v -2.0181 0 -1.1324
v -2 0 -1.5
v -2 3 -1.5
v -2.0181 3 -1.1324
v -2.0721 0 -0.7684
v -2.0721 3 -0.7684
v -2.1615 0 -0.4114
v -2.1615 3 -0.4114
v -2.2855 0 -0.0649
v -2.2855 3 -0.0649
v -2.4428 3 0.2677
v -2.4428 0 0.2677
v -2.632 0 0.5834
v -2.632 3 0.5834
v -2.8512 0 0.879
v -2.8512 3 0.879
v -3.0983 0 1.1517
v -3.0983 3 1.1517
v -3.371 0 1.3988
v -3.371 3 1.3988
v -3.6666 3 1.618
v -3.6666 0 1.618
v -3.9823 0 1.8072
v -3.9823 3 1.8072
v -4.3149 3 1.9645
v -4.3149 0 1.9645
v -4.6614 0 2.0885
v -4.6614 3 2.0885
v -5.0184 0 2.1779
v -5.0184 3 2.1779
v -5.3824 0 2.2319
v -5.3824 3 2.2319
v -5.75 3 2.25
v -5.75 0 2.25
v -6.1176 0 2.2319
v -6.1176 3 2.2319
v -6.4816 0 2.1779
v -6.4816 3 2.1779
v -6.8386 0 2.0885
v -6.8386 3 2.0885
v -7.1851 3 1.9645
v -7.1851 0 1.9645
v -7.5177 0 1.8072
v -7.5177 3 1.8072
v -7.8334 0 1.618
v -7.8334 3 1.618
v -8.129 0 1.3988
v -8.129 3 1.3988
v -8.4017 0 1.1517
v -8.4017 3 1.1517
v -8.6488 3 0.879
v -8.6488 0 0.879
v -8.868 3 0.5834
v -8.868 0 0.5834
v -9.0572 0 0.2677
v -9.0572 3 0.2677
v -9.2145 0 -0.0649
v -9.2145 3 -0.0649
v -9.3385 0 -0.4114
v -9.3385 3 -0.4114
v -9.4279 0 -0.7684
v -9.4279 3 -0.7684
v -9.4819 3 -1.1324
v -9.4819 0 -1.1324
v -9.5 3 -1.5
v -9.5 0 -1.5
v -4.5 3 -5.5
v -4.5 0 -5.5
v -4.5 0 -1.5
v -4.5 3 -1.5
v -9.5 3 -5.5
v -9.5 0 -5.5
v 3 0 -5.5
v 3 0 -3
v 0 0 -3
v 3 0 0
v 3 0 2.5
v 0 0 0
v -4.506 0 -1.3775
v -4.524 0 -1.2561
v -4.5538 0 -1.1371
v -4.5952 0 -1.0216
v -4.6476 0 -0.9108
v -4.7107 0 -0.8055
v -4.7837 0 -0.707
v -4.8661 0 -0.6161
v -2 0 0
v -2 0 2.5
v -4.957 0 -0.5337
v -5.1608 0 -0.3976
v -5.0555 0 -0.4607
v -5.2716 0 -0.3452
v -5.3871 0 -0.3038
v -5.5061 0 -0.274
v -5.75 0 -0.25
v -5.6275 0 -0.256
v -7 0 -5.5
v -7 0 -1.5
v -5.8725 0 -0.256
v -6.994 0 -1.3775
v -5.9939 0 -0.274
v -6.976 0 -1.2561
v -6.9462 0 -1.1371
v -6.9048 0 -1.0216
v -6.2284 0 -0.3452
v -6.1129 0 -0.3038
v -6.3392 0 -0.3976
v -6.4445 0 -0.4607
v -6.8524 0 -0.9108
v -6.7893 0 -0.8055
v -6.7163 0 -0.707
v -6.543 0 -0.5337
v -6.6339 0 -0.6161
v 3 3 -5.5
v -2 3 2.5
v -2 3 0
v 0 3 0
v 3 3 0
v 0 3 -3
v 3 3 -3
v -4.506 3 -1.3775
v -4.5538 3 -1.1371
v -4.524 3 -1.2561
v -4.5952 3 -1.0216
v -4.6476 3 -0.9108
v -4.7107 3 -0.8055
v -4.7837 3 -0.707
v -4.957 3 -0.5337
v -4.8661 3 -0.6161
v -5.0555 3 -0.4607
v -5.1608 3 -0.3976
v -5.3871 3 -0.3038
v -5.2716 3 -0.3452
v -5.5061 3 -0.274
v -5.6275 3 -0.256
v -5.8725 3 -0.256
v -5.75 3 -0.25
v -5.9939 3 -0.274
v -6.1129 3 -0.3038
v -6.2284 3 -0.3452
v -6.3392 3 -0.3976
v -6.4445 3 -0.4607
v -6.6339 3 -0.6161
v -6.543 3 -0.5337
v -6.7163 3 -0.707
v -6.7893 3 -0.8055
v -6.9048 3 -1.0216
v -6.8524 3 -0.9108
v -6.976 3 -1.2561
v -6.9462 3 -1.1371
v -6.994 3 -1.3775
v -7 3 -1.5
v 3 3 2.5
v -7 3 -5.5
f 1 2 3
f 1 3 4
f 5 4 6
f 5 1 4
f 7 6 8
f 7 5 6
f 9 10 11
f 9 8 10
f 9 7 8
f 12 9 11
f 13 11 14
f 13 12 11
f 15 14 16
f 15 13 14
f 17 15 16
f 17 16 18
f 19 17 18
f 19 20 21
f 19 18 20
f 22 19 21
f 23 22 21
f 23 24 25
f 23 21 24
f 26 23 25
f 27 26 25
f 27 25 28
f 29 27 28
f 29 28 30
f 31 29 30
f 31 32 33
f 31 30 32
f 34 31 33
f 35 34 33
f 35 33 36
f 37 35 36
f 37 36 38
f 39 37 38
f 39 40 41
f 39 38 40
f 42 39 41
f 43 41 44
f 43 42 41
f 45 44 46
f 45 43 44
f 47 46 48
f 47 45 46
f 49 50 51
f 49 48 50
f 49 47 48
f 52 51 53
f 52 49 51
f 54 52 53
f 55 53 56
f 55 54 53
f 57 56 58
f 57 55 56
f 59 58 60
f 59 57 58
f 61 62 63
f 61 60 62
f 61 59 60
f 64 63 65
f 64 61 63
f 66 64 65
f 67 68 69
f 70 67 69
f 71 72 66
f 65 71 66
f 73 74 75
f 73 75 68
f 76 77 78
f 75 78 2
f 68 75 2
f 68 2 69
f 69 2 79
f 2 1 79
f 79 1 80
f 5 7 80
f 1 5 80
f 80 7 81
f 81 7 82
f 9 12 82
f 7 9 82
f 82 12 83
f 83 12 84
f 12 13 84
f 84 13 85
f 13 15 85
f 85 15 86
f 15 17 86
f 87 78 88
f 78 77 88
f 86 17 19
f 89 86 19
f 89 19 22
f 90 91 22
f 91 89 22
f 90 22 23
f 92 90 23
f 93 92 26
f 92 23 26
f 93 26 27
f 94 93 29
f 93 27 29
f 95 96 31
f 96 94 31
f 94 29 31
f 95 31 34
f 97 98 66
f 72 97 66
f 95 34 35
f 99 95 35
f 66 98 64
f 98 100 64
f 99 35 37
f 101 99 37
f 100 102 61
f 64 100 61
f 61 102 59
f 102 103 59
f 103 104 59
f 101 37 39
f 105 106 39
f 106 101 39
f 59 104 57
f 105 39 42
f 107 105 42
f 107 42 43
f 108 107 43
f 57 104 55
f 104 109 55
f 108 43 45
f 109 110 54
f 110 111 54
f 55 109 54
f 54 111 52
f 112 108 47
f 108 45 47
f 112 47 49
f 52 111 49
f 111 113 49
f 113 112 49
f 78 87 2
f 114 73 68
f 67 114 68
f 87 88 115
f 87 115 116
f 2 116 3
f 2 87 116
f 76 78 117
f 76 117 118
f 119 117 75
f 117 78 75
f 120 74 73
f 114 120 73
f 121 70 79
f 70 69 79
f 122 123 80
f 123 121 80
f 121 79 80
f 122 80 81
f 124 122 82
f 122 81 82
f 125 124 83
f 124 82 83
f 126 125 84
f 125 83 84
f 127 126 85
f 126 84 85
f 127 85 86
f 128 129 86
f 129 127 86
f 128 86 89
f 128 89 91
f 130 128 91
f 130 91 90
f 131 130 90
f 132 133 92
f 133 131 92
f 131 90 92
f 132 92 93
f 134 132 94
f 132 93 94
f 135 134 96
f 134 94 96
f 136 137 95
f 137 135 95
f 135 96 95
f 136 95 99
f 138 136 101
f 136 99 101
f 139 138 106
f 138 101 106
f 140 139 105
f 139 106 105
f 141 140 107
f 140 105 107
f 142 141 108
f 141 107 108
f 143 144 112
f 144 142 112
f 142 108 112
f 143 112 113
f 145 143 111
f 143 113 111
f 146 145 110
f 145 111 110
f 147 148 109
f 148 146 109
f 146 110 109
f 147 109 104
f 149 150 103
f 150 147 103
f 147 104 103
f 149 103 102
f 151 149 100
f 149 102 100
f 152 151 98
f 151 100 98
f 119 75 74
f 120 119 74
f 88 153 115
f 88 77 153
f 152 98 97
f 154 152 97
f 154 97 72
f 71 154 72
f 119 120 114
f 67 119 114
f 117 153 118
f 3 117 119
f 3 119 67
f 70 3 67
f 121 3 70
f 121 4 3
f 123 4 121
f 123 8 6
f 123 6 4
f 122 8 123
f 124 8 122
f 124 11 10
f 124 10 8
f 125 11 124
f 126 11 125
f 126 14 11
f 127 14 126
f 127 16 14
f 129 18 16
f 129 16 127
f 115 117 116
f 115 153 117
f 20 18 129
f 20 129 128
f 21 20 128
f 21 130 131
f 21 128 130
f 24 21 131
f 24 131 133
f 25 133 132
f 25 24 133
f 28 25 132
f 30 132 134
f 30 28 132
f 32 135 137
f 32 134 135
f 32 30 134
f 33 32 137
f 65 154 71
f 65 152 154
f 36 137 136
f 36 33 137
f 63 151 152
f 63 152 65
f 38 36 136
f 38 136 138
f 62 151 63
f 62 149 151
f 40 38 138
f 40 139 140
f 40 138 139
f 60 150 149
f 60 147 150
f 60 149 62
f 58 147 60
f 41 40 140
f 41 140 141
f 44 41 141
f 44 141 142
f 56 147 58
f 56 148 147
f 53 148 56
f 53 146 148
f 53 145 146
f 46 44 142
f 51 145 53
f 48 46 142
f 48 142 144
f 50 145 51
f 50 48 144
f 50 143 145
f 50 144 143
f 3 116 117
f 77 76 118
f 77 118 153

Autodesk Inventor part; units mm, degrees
ref_plane "YZ Plane" through (0, 0, 0) normal (1, 0, 0) x (0, 1, 0)
ref_plane "XZ Plane" through (0, 0, 0) normal (0, 1, 0) x (-1, 0, 0)
ref_plane "XY Plane" through (0, 0, 0) normal (0, 0, 1) x (1, 0, 0)
sketch "Sketch1" plane through (0, 0, 0) normal (0, 1, 0) x (-1, 0, 0)
  line L0 (0, 0) -> (0, -3)
  line L1 (0, -3) -> (-3, -3)
  line L2 (0, 0) -> (-3, 0)
  line L3 (-3, 0) -> (-3, 2.5)
  line L4 (-3, 2.5) -> (2, 2.5)
  line L5 (2, 2.5) -> (2, 0)
  line L6 (-3, -3) -> (-3, -5.5)
  line L7 (-3, -5.5) -> (4.5, -5.5)
  line L8 (4.5, -5.5) -> (4.5, -1.5)
  arc A0 (7, -1.5) -> (4.5, -1.5) centre (5.75, -1.5) ccw
  line L9 (7, -1.5) -> (7, -5.5)
  line L10 (7, -5.5) -> (9.5, -5.5)
  line L11 (9.5, -5.5) -> (9.5, -1.5)
  line L12 (2, 0) -> (2, -1.5)
  line L13 (4.5, -1.5) -> (2, -1.5) construction
  arc A1 (9.5, -1.5) -> (2, -1.5) centre (5.75, -1.5) ccw
  line L14 (2, -1.5) -> (2, -1.5)
  dimension "d0" = 3
  dimension "d1" = 3
  dimension "d2" = 2.5
  dimension "d3" = 5
  dimension "d4" = 2.5
  dimension "d5" = 7.5
  dimension "d6" = 2.5
  dimension "d7" = 1.25
  dimension "d8" = 2.5
  dimension "d9" = 2.5
  dimension "d10" = 3
  dimension "d13" = 0
  dimension "d14" = 2
extrude "Extrusion1" add sketch "Sketch1" along normal blind 3
equation "\"d2\" = d4"
equation "\"d8\" = d4"
equation "\"d10\" = d1"
properties part number "rubber_band_hook"
